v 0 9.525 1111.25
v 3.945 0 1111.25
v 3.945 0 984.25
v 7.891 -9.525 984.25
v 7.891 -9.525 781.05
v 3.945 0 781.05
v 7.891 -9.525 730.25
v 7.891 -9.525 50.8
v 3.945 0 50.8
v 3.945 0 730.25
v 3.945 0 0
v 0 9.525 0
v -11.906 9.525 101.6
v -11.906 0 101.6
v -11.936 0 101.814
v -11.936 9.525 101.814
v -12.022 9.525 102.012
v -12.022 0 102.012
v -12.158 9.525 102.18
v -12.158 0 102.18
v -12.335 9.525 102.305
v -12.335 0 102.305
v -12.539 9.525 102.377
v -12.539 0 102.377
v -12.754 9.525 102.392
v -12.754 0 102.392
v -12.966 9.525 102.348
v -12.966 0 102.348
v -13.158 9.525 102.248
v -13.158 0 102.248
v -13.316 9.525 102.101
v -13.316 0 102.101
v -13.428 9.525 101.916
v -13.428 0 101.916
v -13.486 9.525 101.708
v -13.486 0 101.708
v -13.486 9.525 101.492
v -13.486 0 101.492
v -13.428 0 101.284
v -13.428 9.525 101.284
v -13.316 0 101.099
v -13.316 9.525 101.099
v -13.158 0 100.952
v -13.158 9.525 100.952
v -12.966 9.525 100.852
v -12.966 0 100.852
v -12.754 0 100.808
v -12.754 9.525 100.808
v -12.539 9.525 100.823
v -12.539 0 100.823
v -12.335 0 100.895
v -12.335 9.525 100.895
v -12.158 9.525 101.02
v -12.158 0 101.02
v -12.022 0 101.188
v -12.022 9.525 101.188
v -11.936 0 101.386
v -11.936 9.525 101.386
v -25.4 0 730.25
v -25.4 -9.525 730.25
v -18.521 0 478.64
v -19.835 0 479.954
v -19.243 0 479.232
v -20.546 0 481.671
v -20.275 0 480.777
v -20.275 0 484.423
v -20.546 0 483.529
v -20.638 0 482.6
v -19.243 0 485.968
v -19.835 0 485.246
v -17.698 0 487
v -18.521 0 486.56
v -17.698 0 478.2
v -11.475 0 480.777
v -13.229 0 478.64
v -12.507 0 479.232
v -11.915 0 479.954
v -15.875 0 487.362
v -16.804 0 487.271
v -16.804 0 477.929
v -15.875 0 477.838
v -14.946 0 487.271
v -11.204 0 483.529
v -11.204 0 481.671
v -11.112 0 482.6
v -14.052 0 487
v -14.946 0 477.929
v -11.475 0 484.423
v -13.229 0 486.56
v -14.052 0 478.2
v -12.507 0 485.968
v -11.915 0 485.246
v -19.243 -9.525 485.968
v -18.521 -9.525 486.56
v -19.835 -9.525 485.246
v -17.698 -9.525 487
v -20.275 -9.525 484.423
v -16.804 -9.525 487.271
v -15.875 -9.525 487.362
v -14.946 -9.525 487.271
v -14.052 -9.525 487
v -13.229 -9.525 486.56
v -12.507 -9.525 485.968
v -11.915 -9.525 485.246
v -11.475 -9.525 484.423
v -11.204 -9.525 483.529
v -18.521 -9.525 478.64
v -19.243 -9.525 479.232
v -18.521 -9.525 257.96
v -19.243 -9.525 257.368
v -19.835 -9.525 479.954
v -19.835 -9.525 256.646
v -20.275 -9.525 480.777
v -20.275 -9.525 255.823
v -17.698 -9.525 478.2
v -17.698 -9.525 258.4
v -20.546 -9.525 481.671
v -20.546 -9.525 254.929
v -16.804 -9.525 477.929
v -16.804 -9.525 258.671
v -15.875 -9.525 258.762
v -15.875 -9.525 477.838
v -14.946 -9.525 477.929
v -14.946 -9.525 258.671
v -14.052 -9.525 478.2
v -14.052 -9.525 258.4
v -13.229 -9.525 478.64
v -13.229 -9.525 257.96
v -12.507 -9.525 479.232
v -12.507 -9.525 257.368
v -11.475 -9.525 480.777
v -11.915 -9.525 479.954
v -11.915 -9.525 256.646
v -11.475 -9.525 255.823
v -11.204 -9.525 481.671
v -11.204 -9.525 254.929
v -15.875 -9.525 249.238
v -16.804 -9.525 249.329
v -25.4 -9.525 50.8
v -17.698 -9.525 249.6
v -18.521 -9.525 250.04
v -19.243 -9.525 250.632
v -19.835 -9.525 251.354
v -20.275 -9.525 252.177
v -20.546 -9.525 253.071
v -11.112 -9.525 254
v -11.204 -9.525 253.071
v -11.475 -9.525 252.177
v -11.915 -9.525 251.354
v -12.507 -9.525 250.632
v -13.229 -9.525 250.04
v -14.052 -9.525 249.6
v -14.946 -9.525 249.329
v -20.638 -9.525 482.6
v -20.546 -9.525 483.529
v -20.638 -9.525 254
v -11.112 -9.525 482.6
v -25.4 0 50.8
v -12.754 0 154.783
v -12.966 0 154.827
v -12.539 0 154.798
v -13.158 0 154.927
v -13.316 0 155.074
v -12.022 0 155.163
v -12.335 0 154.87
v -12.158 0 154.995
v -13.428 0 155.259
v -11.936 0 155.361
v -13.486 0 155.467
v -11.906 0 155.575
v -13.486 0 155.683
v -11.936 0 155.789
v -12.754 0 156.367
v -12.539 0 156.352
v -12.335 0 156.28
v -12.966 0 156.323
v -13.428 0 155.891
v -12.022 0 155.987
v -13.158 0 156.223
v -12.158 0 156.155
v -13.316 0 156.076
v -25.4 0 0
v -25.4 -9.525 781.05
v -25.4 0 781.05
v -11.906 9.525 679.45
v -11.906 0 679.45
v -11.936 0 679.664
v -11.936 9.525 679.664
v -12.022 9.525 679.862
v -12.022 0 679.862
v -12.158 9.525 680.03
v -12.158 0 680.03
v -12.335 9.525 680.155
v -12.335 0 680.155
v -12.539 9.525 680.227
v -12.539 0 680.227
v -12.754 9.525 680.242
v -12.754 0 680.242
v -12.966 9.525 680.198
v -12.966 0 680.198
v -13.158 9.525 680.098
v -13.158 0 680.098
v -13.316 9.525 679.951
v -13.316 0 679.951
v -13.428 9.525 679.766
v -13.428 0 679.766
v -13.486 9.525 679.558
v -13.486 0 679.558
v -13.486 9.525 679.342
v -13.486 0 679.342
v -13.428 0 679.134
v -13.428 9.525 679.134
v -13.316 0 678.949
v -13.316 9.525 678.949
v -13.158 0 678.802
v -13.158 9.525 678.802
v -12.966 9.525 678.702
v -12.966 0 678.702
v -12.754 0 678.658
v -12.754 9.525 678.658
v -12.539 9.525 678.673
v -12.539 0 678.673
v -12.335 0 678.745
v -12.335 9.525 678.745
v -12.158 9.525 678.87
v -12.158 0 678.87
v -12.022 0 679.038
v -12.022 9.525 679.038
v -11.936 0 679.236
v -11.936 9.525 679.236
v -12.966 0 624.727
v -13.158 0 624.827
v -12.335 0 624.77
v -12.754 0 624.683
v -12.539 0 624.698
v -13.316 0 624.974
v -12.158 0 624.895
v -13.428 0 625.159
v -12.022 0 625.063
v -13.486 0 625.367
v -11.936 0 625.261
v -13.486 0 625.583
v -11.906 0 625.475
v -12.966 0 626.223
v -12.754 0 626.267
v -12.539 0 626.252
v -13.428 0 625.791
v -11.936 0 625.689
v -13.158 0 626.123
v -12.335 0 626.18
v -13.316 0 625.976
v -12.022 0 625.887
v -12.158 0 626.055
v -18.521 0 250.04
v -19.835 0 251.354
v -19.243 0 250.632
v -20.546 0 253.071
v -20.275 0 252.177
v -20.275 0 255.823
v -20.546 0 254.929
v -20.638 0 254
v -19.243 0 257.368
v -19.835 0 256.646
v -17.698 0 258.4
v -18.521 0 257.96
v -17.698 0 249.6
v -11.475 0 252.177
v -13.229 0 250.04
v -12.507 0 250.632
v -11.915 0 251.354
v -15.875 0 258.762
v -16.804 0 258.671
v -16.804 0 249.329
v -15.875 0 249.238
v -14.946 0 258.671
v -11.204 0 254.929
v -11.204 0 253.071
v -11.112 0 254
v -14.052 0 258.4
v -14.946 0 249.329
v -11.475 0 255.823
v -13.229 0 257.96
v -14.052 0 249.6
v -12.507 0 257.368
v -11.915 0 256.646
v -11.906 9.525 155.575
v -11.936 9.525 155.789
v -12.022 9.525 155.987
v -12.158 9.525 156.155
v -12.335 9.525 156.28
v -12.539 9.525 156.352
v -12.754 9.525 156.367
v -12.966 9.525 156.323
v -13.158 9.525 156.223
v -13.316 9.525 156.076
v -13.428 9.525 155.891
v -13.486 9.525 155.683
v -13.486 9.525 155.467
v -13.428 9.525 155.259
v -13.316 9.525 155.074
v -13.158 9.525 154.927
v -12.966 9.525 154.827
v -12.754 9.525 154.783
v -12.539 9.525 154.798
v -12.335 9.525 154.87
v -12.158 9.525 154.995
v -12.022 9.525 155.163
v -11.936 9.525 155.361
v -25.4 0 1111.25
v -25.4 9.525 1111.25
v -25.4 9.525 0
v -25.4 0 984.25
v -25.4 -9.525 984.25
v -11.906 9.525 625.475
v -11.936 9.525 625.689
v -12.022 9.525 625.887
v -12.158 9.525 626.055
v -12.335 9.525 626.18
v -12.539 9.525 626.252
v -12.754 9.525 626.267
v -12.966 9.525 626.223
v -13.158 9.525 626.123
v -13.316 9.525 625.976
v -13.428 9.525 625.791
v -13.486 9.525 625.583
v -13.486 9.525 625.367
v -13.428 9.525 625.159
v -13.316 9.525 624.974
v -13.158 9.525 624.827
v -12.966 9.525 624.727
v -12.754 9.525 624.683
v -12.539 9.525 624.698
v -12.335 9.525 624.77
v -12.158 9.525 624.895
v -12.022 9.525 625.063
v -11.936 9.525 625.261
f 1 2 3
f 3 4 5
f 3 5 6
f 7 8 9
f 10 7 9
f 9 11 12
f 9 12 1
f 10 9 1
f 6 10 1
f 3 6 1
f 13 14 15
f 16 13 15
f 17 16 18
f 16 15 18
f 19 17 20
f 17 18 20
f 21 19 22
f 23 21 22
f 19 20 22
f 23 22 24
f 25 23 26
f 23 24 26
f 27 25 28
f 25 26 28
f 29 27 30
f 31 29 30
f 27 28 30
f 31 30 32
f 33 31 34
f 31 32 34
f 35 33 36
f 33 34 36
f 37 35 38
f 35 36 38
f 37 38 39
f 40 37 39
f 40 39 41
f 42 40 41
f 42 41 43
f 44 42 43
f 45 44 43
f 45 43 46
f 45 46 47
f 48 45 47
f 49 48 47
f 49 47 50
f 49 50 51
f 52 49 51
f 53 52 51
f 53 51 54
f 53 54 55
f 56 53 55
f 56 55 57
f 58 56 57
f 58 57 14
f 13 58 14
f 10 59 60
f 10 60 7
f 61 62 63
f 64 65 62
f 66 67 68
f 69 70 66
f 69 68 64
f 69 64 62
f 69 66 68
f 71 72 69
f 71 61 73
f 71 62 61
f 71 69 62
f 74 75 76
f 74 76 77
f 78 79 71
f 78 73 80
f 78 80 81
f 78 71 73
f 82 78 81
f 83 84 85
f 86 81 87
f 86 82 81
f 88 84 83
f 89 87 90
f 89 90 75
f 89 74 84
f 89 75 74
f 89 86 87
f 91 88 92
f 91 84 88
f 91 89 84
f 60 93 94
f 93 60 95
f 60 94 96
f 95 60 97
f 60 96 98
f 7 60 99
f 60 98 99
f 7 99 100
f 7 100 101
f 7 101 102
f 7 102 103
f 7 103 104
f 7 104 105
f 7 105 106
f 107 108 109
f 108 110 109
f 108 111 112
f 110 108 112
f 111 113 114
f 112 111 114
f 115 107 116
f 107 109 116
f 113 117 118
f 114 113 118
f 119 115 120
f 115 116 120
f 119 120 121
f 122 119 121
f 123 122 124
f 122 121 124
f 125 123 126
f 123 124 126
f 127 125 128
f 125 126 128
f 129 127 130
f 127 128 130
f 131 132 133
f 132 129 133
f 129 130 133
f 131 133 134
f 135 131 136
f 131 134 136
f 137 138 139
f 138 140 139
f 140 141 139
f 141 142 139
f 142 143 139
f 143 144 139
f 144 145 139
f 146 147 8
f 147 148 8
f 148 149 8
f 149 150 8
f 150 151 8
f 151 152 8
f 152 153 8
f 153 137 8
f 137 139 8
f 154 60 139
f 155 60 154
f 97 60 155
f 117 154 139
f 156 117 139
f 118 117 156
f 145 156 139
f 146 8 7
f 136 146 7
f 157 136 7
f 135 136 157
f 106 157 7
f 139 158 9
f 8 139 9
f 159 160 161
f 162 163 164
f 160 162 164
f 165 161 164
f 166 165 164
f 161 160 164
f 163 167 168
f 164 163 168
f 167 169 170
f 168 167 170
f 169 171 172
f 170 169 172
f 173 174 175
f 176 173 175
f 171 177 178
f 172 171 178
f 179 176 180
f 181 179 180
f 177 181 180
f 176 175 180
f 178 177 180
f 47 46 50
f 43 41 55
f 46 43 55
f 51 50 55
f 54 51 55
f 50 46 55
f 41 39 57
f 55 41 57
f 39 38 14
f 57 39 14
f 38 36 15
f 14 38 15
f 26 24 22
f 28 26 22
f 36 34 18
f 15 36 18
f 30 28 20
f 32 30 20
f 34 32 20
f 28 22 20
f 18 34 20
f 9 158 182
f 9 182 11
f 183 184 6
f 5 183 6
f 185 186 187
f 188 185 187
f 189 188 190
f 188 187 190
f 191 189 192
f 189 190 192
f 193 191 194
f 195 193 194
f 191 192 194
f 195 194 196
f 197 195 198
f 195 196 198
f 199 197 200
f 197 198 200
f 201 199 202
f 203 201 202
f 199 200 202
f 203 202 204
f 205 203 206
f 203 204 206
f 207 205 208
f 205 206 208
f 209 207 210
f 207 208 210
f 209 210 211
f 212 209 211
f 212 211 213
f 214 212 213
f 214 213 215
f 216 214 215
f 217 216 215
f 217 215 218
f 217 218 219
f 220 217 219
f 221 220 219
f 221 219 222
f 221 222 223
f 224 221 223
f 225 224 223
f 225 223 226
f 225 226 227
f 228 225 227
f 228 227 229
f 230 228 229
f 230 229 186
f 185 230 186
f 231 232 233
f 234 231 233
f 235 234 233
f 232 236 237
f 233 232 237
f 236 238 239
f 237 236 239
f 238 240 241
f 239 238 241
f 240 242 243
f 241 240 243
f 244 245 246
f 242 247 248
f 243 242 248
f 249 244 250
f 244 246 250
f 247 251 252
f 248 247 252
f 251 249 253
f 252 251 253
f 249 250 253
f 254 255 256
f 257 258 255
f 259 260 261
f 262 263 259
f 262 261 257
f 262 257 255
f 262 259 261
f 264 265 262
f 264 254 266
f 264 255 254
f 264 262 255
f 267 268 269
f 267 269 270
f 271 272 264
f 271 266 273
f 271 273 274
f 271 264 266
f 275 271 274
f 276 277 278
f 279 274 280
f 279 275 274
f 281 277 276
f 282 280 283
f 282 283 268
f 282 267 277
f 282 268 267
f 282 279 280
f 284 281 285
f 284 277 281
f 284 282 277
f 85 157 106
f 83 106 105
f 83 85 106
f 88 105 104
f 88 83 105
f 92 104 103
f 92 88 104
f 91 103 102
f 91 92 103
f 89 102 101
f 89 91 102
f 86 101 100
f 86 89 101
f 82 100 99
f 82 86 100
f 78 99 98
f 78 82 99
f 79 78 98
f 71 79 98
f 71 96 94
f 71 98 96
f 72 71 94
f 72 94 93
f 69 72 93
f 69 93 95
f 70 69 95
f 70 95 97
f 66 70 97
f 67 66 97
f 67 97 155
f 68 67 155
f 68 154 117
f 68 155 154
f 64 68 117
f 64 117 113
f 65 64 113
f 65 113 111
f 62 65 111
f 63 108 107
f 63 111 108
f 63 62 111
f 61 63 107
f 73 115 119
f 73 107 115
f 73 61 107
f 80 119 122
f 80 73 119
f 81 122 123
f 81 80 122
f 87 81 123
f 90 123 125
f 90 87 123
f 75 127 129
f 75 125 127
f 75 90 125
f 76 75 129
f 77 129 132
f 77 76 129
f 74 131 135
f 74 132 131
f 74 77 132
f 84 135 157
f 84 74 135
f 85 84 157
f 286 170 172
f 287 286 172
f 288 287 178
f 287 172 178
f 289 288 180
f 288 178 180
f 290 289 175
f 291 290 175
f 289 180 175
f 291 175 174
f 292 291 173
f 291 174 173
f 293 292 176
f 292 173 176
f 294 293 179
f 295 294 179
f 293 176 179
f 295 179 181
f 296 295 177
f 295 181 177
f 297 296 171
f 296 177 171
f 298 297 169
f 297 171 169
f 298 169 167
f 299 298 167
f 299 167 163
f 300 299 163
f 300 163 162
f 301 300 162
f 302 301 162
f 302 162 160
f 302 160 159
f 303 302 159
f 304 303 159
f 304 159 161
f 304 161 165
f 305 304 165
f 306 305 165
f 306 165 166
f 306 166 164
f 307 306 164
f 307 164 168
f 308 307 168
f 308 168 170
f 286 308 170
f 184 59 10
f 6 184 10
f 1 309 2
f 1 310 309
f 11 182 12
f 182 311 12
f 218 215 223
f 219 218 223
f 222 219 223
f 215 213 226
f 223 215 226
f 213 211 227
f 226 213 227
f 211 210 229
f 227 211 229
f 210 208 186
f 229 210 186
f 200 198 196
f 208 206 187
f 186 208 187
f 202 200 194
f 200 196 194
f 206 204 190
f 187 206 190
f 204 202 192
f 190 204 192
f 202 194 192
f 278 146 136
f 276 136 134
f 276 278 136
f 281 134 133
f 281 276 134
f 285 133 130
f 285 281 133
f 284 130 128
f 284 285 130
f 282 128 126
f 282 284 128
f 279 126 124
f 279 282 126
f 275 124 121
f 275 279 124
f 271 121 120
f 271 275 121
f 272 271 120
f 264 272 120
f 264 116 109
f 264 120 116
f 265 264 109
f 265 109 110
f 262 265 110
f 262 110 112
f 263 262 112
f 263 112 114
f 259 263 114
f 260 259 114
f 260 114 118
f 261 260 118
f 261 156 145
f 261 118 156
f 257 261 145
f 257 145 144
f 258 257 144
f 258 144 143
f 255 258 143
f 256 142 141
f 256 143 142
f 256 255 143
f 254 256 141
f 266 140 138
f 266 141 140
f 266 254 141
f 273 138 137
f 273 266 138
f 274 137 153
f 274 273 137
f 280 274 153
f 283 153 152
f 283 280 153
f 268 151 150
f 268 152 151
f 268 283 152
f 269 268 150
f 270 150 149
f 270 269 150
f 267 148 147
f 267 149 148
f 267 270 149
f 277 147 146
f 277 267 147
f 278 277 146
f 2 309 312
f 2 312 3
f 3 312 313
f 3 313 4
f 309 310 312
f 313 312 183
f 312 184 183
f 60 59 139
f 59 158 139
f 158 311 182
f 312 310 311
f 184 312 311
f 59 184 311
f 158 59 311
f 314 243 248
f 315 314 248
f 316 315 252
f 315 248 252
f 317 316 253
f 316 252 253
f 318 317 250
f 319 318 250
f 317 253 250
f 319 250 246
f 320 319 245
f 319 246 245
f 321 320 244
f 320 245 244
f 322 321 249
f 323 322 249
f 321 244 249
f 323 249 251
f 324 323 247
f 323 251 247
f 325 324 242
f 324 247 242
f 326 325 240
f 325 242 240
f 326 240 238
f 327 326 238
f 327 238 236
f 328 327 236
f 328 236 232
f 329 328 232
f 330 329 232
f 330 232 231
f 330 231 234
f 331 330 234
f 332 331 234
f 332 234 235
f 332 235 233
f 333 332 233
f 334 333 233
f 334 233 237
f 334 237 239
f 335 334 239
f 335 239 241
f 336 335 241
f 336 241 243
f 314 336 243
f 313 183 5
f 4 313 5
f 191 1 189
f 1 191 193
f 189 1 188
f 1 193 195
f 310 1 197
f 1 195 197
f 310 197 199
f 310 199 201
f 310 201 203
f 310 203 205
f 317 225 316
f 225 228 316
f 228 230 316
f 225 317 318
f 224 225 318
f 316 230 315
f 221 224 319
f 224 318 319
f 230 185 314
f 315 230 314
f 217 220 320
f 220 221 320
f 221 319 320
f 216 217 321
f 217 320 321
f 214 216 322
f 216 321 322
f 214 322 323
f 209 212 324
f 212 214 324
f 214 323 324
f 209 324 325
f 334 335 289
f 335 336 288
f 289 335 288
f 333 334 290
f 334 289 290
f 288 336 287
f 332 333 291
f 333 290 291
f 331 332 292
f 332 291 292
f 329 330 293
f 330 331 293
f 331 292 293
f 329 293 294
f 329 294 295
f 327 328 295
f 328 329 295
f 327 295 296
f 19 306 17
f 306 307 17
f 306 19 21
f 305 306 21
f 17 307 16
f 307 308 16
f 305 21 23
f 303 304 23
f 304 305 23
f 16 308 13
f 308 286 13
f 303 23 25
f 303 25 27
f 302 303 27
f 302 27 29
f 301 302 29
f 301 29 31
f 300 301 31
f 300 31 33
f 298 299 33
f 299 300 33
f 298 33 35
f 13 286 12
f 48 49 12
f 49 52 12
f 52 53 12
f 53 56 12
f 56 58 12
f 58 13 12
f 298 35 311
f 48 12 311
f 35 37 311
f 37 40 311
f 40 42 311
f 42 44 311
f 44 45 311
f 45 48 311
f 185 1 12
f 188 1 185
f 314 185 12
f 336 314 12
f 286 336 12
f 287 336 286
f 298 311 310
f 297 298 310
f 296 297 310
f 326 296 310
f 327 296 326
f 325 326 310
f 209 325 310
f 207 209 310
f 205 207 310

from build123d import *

# Parameters (mm, degrees)
F1_DEPTH = 1111.25
F2_W     = 122.435573
F2_H     = 50.8
F2_W_2   = 93.867282
F2_W_3   = 343.160421
F2_H_2   = 127
F3_DEPTH = 25.4
F4_R     = 0.79375
F5_DEPTH = 25.4
F6_R     = 4.7625
F7_DEPTH = 25.4


with BuildPart() as f1:
    # F0 (on Top) → F1 (new body)
    with BuildSketch(Plane.XY):
        Polygon((7.890768, -9.525), (0, 9.525), (-25.4, 9.525), (-25.4, -9.525), align=None)
    extrude(amount=F1_DEPTH)

    # F2 (on Front) → F3 (cut)
    with BuildSketch(Plane.XZ):
        with Locations((22.446524, 25.4)):
            Rectangle(F2_W, F2_H)
        with Locations((2.720783, 755.65)):
            Rectangle(F2_W_2, F2_H)
        with Locations((-38.781822, 1047.75)):
            Rectangle(F2_W_3, F2_H_2)
    extrude(amount=F3_DEPTH, mode=Mode.SUBTRACT)

    # F4 (on Front) → F5 (cut)
    with BuildSketch(Plane.XZ):
        with Locations((12.7, 101.6)):
            Circle(F4_R)
        with Locations((12.7, 155.575)):
            Circle(F4_R)
        with Locations((12.7, 625.475)):
            Circle(F4_R)
        with Locations((12.7, 679.45)):
            Circle(F4_R)
        with Locations((-12.7, 625.475)):
            Circle(F4_R)
        with Locations((-12.7, 679.45)):
            Circle(F4_R)
        with Locations((-12.7, 101.6)):
            Circle(F4_R)
        with Locations((-12.7, 155.575)):
            Circle(F4_R)
    extrude(amount=-F5_DEPTH, mode=Mode.SUBTRACT)

    # F6 (on Front) → F7 (cut)
    with BuildSketch(Plane.XZ):
        with Locations((-15.875, 254)):
            Circle(F6_R)
        with Locations((-15.875, 482.6)):
            Circle(F6_R)
    extrude(amount=F7_DEPTH, mode=Mode.SUBTRACT)


solid = f1.part
